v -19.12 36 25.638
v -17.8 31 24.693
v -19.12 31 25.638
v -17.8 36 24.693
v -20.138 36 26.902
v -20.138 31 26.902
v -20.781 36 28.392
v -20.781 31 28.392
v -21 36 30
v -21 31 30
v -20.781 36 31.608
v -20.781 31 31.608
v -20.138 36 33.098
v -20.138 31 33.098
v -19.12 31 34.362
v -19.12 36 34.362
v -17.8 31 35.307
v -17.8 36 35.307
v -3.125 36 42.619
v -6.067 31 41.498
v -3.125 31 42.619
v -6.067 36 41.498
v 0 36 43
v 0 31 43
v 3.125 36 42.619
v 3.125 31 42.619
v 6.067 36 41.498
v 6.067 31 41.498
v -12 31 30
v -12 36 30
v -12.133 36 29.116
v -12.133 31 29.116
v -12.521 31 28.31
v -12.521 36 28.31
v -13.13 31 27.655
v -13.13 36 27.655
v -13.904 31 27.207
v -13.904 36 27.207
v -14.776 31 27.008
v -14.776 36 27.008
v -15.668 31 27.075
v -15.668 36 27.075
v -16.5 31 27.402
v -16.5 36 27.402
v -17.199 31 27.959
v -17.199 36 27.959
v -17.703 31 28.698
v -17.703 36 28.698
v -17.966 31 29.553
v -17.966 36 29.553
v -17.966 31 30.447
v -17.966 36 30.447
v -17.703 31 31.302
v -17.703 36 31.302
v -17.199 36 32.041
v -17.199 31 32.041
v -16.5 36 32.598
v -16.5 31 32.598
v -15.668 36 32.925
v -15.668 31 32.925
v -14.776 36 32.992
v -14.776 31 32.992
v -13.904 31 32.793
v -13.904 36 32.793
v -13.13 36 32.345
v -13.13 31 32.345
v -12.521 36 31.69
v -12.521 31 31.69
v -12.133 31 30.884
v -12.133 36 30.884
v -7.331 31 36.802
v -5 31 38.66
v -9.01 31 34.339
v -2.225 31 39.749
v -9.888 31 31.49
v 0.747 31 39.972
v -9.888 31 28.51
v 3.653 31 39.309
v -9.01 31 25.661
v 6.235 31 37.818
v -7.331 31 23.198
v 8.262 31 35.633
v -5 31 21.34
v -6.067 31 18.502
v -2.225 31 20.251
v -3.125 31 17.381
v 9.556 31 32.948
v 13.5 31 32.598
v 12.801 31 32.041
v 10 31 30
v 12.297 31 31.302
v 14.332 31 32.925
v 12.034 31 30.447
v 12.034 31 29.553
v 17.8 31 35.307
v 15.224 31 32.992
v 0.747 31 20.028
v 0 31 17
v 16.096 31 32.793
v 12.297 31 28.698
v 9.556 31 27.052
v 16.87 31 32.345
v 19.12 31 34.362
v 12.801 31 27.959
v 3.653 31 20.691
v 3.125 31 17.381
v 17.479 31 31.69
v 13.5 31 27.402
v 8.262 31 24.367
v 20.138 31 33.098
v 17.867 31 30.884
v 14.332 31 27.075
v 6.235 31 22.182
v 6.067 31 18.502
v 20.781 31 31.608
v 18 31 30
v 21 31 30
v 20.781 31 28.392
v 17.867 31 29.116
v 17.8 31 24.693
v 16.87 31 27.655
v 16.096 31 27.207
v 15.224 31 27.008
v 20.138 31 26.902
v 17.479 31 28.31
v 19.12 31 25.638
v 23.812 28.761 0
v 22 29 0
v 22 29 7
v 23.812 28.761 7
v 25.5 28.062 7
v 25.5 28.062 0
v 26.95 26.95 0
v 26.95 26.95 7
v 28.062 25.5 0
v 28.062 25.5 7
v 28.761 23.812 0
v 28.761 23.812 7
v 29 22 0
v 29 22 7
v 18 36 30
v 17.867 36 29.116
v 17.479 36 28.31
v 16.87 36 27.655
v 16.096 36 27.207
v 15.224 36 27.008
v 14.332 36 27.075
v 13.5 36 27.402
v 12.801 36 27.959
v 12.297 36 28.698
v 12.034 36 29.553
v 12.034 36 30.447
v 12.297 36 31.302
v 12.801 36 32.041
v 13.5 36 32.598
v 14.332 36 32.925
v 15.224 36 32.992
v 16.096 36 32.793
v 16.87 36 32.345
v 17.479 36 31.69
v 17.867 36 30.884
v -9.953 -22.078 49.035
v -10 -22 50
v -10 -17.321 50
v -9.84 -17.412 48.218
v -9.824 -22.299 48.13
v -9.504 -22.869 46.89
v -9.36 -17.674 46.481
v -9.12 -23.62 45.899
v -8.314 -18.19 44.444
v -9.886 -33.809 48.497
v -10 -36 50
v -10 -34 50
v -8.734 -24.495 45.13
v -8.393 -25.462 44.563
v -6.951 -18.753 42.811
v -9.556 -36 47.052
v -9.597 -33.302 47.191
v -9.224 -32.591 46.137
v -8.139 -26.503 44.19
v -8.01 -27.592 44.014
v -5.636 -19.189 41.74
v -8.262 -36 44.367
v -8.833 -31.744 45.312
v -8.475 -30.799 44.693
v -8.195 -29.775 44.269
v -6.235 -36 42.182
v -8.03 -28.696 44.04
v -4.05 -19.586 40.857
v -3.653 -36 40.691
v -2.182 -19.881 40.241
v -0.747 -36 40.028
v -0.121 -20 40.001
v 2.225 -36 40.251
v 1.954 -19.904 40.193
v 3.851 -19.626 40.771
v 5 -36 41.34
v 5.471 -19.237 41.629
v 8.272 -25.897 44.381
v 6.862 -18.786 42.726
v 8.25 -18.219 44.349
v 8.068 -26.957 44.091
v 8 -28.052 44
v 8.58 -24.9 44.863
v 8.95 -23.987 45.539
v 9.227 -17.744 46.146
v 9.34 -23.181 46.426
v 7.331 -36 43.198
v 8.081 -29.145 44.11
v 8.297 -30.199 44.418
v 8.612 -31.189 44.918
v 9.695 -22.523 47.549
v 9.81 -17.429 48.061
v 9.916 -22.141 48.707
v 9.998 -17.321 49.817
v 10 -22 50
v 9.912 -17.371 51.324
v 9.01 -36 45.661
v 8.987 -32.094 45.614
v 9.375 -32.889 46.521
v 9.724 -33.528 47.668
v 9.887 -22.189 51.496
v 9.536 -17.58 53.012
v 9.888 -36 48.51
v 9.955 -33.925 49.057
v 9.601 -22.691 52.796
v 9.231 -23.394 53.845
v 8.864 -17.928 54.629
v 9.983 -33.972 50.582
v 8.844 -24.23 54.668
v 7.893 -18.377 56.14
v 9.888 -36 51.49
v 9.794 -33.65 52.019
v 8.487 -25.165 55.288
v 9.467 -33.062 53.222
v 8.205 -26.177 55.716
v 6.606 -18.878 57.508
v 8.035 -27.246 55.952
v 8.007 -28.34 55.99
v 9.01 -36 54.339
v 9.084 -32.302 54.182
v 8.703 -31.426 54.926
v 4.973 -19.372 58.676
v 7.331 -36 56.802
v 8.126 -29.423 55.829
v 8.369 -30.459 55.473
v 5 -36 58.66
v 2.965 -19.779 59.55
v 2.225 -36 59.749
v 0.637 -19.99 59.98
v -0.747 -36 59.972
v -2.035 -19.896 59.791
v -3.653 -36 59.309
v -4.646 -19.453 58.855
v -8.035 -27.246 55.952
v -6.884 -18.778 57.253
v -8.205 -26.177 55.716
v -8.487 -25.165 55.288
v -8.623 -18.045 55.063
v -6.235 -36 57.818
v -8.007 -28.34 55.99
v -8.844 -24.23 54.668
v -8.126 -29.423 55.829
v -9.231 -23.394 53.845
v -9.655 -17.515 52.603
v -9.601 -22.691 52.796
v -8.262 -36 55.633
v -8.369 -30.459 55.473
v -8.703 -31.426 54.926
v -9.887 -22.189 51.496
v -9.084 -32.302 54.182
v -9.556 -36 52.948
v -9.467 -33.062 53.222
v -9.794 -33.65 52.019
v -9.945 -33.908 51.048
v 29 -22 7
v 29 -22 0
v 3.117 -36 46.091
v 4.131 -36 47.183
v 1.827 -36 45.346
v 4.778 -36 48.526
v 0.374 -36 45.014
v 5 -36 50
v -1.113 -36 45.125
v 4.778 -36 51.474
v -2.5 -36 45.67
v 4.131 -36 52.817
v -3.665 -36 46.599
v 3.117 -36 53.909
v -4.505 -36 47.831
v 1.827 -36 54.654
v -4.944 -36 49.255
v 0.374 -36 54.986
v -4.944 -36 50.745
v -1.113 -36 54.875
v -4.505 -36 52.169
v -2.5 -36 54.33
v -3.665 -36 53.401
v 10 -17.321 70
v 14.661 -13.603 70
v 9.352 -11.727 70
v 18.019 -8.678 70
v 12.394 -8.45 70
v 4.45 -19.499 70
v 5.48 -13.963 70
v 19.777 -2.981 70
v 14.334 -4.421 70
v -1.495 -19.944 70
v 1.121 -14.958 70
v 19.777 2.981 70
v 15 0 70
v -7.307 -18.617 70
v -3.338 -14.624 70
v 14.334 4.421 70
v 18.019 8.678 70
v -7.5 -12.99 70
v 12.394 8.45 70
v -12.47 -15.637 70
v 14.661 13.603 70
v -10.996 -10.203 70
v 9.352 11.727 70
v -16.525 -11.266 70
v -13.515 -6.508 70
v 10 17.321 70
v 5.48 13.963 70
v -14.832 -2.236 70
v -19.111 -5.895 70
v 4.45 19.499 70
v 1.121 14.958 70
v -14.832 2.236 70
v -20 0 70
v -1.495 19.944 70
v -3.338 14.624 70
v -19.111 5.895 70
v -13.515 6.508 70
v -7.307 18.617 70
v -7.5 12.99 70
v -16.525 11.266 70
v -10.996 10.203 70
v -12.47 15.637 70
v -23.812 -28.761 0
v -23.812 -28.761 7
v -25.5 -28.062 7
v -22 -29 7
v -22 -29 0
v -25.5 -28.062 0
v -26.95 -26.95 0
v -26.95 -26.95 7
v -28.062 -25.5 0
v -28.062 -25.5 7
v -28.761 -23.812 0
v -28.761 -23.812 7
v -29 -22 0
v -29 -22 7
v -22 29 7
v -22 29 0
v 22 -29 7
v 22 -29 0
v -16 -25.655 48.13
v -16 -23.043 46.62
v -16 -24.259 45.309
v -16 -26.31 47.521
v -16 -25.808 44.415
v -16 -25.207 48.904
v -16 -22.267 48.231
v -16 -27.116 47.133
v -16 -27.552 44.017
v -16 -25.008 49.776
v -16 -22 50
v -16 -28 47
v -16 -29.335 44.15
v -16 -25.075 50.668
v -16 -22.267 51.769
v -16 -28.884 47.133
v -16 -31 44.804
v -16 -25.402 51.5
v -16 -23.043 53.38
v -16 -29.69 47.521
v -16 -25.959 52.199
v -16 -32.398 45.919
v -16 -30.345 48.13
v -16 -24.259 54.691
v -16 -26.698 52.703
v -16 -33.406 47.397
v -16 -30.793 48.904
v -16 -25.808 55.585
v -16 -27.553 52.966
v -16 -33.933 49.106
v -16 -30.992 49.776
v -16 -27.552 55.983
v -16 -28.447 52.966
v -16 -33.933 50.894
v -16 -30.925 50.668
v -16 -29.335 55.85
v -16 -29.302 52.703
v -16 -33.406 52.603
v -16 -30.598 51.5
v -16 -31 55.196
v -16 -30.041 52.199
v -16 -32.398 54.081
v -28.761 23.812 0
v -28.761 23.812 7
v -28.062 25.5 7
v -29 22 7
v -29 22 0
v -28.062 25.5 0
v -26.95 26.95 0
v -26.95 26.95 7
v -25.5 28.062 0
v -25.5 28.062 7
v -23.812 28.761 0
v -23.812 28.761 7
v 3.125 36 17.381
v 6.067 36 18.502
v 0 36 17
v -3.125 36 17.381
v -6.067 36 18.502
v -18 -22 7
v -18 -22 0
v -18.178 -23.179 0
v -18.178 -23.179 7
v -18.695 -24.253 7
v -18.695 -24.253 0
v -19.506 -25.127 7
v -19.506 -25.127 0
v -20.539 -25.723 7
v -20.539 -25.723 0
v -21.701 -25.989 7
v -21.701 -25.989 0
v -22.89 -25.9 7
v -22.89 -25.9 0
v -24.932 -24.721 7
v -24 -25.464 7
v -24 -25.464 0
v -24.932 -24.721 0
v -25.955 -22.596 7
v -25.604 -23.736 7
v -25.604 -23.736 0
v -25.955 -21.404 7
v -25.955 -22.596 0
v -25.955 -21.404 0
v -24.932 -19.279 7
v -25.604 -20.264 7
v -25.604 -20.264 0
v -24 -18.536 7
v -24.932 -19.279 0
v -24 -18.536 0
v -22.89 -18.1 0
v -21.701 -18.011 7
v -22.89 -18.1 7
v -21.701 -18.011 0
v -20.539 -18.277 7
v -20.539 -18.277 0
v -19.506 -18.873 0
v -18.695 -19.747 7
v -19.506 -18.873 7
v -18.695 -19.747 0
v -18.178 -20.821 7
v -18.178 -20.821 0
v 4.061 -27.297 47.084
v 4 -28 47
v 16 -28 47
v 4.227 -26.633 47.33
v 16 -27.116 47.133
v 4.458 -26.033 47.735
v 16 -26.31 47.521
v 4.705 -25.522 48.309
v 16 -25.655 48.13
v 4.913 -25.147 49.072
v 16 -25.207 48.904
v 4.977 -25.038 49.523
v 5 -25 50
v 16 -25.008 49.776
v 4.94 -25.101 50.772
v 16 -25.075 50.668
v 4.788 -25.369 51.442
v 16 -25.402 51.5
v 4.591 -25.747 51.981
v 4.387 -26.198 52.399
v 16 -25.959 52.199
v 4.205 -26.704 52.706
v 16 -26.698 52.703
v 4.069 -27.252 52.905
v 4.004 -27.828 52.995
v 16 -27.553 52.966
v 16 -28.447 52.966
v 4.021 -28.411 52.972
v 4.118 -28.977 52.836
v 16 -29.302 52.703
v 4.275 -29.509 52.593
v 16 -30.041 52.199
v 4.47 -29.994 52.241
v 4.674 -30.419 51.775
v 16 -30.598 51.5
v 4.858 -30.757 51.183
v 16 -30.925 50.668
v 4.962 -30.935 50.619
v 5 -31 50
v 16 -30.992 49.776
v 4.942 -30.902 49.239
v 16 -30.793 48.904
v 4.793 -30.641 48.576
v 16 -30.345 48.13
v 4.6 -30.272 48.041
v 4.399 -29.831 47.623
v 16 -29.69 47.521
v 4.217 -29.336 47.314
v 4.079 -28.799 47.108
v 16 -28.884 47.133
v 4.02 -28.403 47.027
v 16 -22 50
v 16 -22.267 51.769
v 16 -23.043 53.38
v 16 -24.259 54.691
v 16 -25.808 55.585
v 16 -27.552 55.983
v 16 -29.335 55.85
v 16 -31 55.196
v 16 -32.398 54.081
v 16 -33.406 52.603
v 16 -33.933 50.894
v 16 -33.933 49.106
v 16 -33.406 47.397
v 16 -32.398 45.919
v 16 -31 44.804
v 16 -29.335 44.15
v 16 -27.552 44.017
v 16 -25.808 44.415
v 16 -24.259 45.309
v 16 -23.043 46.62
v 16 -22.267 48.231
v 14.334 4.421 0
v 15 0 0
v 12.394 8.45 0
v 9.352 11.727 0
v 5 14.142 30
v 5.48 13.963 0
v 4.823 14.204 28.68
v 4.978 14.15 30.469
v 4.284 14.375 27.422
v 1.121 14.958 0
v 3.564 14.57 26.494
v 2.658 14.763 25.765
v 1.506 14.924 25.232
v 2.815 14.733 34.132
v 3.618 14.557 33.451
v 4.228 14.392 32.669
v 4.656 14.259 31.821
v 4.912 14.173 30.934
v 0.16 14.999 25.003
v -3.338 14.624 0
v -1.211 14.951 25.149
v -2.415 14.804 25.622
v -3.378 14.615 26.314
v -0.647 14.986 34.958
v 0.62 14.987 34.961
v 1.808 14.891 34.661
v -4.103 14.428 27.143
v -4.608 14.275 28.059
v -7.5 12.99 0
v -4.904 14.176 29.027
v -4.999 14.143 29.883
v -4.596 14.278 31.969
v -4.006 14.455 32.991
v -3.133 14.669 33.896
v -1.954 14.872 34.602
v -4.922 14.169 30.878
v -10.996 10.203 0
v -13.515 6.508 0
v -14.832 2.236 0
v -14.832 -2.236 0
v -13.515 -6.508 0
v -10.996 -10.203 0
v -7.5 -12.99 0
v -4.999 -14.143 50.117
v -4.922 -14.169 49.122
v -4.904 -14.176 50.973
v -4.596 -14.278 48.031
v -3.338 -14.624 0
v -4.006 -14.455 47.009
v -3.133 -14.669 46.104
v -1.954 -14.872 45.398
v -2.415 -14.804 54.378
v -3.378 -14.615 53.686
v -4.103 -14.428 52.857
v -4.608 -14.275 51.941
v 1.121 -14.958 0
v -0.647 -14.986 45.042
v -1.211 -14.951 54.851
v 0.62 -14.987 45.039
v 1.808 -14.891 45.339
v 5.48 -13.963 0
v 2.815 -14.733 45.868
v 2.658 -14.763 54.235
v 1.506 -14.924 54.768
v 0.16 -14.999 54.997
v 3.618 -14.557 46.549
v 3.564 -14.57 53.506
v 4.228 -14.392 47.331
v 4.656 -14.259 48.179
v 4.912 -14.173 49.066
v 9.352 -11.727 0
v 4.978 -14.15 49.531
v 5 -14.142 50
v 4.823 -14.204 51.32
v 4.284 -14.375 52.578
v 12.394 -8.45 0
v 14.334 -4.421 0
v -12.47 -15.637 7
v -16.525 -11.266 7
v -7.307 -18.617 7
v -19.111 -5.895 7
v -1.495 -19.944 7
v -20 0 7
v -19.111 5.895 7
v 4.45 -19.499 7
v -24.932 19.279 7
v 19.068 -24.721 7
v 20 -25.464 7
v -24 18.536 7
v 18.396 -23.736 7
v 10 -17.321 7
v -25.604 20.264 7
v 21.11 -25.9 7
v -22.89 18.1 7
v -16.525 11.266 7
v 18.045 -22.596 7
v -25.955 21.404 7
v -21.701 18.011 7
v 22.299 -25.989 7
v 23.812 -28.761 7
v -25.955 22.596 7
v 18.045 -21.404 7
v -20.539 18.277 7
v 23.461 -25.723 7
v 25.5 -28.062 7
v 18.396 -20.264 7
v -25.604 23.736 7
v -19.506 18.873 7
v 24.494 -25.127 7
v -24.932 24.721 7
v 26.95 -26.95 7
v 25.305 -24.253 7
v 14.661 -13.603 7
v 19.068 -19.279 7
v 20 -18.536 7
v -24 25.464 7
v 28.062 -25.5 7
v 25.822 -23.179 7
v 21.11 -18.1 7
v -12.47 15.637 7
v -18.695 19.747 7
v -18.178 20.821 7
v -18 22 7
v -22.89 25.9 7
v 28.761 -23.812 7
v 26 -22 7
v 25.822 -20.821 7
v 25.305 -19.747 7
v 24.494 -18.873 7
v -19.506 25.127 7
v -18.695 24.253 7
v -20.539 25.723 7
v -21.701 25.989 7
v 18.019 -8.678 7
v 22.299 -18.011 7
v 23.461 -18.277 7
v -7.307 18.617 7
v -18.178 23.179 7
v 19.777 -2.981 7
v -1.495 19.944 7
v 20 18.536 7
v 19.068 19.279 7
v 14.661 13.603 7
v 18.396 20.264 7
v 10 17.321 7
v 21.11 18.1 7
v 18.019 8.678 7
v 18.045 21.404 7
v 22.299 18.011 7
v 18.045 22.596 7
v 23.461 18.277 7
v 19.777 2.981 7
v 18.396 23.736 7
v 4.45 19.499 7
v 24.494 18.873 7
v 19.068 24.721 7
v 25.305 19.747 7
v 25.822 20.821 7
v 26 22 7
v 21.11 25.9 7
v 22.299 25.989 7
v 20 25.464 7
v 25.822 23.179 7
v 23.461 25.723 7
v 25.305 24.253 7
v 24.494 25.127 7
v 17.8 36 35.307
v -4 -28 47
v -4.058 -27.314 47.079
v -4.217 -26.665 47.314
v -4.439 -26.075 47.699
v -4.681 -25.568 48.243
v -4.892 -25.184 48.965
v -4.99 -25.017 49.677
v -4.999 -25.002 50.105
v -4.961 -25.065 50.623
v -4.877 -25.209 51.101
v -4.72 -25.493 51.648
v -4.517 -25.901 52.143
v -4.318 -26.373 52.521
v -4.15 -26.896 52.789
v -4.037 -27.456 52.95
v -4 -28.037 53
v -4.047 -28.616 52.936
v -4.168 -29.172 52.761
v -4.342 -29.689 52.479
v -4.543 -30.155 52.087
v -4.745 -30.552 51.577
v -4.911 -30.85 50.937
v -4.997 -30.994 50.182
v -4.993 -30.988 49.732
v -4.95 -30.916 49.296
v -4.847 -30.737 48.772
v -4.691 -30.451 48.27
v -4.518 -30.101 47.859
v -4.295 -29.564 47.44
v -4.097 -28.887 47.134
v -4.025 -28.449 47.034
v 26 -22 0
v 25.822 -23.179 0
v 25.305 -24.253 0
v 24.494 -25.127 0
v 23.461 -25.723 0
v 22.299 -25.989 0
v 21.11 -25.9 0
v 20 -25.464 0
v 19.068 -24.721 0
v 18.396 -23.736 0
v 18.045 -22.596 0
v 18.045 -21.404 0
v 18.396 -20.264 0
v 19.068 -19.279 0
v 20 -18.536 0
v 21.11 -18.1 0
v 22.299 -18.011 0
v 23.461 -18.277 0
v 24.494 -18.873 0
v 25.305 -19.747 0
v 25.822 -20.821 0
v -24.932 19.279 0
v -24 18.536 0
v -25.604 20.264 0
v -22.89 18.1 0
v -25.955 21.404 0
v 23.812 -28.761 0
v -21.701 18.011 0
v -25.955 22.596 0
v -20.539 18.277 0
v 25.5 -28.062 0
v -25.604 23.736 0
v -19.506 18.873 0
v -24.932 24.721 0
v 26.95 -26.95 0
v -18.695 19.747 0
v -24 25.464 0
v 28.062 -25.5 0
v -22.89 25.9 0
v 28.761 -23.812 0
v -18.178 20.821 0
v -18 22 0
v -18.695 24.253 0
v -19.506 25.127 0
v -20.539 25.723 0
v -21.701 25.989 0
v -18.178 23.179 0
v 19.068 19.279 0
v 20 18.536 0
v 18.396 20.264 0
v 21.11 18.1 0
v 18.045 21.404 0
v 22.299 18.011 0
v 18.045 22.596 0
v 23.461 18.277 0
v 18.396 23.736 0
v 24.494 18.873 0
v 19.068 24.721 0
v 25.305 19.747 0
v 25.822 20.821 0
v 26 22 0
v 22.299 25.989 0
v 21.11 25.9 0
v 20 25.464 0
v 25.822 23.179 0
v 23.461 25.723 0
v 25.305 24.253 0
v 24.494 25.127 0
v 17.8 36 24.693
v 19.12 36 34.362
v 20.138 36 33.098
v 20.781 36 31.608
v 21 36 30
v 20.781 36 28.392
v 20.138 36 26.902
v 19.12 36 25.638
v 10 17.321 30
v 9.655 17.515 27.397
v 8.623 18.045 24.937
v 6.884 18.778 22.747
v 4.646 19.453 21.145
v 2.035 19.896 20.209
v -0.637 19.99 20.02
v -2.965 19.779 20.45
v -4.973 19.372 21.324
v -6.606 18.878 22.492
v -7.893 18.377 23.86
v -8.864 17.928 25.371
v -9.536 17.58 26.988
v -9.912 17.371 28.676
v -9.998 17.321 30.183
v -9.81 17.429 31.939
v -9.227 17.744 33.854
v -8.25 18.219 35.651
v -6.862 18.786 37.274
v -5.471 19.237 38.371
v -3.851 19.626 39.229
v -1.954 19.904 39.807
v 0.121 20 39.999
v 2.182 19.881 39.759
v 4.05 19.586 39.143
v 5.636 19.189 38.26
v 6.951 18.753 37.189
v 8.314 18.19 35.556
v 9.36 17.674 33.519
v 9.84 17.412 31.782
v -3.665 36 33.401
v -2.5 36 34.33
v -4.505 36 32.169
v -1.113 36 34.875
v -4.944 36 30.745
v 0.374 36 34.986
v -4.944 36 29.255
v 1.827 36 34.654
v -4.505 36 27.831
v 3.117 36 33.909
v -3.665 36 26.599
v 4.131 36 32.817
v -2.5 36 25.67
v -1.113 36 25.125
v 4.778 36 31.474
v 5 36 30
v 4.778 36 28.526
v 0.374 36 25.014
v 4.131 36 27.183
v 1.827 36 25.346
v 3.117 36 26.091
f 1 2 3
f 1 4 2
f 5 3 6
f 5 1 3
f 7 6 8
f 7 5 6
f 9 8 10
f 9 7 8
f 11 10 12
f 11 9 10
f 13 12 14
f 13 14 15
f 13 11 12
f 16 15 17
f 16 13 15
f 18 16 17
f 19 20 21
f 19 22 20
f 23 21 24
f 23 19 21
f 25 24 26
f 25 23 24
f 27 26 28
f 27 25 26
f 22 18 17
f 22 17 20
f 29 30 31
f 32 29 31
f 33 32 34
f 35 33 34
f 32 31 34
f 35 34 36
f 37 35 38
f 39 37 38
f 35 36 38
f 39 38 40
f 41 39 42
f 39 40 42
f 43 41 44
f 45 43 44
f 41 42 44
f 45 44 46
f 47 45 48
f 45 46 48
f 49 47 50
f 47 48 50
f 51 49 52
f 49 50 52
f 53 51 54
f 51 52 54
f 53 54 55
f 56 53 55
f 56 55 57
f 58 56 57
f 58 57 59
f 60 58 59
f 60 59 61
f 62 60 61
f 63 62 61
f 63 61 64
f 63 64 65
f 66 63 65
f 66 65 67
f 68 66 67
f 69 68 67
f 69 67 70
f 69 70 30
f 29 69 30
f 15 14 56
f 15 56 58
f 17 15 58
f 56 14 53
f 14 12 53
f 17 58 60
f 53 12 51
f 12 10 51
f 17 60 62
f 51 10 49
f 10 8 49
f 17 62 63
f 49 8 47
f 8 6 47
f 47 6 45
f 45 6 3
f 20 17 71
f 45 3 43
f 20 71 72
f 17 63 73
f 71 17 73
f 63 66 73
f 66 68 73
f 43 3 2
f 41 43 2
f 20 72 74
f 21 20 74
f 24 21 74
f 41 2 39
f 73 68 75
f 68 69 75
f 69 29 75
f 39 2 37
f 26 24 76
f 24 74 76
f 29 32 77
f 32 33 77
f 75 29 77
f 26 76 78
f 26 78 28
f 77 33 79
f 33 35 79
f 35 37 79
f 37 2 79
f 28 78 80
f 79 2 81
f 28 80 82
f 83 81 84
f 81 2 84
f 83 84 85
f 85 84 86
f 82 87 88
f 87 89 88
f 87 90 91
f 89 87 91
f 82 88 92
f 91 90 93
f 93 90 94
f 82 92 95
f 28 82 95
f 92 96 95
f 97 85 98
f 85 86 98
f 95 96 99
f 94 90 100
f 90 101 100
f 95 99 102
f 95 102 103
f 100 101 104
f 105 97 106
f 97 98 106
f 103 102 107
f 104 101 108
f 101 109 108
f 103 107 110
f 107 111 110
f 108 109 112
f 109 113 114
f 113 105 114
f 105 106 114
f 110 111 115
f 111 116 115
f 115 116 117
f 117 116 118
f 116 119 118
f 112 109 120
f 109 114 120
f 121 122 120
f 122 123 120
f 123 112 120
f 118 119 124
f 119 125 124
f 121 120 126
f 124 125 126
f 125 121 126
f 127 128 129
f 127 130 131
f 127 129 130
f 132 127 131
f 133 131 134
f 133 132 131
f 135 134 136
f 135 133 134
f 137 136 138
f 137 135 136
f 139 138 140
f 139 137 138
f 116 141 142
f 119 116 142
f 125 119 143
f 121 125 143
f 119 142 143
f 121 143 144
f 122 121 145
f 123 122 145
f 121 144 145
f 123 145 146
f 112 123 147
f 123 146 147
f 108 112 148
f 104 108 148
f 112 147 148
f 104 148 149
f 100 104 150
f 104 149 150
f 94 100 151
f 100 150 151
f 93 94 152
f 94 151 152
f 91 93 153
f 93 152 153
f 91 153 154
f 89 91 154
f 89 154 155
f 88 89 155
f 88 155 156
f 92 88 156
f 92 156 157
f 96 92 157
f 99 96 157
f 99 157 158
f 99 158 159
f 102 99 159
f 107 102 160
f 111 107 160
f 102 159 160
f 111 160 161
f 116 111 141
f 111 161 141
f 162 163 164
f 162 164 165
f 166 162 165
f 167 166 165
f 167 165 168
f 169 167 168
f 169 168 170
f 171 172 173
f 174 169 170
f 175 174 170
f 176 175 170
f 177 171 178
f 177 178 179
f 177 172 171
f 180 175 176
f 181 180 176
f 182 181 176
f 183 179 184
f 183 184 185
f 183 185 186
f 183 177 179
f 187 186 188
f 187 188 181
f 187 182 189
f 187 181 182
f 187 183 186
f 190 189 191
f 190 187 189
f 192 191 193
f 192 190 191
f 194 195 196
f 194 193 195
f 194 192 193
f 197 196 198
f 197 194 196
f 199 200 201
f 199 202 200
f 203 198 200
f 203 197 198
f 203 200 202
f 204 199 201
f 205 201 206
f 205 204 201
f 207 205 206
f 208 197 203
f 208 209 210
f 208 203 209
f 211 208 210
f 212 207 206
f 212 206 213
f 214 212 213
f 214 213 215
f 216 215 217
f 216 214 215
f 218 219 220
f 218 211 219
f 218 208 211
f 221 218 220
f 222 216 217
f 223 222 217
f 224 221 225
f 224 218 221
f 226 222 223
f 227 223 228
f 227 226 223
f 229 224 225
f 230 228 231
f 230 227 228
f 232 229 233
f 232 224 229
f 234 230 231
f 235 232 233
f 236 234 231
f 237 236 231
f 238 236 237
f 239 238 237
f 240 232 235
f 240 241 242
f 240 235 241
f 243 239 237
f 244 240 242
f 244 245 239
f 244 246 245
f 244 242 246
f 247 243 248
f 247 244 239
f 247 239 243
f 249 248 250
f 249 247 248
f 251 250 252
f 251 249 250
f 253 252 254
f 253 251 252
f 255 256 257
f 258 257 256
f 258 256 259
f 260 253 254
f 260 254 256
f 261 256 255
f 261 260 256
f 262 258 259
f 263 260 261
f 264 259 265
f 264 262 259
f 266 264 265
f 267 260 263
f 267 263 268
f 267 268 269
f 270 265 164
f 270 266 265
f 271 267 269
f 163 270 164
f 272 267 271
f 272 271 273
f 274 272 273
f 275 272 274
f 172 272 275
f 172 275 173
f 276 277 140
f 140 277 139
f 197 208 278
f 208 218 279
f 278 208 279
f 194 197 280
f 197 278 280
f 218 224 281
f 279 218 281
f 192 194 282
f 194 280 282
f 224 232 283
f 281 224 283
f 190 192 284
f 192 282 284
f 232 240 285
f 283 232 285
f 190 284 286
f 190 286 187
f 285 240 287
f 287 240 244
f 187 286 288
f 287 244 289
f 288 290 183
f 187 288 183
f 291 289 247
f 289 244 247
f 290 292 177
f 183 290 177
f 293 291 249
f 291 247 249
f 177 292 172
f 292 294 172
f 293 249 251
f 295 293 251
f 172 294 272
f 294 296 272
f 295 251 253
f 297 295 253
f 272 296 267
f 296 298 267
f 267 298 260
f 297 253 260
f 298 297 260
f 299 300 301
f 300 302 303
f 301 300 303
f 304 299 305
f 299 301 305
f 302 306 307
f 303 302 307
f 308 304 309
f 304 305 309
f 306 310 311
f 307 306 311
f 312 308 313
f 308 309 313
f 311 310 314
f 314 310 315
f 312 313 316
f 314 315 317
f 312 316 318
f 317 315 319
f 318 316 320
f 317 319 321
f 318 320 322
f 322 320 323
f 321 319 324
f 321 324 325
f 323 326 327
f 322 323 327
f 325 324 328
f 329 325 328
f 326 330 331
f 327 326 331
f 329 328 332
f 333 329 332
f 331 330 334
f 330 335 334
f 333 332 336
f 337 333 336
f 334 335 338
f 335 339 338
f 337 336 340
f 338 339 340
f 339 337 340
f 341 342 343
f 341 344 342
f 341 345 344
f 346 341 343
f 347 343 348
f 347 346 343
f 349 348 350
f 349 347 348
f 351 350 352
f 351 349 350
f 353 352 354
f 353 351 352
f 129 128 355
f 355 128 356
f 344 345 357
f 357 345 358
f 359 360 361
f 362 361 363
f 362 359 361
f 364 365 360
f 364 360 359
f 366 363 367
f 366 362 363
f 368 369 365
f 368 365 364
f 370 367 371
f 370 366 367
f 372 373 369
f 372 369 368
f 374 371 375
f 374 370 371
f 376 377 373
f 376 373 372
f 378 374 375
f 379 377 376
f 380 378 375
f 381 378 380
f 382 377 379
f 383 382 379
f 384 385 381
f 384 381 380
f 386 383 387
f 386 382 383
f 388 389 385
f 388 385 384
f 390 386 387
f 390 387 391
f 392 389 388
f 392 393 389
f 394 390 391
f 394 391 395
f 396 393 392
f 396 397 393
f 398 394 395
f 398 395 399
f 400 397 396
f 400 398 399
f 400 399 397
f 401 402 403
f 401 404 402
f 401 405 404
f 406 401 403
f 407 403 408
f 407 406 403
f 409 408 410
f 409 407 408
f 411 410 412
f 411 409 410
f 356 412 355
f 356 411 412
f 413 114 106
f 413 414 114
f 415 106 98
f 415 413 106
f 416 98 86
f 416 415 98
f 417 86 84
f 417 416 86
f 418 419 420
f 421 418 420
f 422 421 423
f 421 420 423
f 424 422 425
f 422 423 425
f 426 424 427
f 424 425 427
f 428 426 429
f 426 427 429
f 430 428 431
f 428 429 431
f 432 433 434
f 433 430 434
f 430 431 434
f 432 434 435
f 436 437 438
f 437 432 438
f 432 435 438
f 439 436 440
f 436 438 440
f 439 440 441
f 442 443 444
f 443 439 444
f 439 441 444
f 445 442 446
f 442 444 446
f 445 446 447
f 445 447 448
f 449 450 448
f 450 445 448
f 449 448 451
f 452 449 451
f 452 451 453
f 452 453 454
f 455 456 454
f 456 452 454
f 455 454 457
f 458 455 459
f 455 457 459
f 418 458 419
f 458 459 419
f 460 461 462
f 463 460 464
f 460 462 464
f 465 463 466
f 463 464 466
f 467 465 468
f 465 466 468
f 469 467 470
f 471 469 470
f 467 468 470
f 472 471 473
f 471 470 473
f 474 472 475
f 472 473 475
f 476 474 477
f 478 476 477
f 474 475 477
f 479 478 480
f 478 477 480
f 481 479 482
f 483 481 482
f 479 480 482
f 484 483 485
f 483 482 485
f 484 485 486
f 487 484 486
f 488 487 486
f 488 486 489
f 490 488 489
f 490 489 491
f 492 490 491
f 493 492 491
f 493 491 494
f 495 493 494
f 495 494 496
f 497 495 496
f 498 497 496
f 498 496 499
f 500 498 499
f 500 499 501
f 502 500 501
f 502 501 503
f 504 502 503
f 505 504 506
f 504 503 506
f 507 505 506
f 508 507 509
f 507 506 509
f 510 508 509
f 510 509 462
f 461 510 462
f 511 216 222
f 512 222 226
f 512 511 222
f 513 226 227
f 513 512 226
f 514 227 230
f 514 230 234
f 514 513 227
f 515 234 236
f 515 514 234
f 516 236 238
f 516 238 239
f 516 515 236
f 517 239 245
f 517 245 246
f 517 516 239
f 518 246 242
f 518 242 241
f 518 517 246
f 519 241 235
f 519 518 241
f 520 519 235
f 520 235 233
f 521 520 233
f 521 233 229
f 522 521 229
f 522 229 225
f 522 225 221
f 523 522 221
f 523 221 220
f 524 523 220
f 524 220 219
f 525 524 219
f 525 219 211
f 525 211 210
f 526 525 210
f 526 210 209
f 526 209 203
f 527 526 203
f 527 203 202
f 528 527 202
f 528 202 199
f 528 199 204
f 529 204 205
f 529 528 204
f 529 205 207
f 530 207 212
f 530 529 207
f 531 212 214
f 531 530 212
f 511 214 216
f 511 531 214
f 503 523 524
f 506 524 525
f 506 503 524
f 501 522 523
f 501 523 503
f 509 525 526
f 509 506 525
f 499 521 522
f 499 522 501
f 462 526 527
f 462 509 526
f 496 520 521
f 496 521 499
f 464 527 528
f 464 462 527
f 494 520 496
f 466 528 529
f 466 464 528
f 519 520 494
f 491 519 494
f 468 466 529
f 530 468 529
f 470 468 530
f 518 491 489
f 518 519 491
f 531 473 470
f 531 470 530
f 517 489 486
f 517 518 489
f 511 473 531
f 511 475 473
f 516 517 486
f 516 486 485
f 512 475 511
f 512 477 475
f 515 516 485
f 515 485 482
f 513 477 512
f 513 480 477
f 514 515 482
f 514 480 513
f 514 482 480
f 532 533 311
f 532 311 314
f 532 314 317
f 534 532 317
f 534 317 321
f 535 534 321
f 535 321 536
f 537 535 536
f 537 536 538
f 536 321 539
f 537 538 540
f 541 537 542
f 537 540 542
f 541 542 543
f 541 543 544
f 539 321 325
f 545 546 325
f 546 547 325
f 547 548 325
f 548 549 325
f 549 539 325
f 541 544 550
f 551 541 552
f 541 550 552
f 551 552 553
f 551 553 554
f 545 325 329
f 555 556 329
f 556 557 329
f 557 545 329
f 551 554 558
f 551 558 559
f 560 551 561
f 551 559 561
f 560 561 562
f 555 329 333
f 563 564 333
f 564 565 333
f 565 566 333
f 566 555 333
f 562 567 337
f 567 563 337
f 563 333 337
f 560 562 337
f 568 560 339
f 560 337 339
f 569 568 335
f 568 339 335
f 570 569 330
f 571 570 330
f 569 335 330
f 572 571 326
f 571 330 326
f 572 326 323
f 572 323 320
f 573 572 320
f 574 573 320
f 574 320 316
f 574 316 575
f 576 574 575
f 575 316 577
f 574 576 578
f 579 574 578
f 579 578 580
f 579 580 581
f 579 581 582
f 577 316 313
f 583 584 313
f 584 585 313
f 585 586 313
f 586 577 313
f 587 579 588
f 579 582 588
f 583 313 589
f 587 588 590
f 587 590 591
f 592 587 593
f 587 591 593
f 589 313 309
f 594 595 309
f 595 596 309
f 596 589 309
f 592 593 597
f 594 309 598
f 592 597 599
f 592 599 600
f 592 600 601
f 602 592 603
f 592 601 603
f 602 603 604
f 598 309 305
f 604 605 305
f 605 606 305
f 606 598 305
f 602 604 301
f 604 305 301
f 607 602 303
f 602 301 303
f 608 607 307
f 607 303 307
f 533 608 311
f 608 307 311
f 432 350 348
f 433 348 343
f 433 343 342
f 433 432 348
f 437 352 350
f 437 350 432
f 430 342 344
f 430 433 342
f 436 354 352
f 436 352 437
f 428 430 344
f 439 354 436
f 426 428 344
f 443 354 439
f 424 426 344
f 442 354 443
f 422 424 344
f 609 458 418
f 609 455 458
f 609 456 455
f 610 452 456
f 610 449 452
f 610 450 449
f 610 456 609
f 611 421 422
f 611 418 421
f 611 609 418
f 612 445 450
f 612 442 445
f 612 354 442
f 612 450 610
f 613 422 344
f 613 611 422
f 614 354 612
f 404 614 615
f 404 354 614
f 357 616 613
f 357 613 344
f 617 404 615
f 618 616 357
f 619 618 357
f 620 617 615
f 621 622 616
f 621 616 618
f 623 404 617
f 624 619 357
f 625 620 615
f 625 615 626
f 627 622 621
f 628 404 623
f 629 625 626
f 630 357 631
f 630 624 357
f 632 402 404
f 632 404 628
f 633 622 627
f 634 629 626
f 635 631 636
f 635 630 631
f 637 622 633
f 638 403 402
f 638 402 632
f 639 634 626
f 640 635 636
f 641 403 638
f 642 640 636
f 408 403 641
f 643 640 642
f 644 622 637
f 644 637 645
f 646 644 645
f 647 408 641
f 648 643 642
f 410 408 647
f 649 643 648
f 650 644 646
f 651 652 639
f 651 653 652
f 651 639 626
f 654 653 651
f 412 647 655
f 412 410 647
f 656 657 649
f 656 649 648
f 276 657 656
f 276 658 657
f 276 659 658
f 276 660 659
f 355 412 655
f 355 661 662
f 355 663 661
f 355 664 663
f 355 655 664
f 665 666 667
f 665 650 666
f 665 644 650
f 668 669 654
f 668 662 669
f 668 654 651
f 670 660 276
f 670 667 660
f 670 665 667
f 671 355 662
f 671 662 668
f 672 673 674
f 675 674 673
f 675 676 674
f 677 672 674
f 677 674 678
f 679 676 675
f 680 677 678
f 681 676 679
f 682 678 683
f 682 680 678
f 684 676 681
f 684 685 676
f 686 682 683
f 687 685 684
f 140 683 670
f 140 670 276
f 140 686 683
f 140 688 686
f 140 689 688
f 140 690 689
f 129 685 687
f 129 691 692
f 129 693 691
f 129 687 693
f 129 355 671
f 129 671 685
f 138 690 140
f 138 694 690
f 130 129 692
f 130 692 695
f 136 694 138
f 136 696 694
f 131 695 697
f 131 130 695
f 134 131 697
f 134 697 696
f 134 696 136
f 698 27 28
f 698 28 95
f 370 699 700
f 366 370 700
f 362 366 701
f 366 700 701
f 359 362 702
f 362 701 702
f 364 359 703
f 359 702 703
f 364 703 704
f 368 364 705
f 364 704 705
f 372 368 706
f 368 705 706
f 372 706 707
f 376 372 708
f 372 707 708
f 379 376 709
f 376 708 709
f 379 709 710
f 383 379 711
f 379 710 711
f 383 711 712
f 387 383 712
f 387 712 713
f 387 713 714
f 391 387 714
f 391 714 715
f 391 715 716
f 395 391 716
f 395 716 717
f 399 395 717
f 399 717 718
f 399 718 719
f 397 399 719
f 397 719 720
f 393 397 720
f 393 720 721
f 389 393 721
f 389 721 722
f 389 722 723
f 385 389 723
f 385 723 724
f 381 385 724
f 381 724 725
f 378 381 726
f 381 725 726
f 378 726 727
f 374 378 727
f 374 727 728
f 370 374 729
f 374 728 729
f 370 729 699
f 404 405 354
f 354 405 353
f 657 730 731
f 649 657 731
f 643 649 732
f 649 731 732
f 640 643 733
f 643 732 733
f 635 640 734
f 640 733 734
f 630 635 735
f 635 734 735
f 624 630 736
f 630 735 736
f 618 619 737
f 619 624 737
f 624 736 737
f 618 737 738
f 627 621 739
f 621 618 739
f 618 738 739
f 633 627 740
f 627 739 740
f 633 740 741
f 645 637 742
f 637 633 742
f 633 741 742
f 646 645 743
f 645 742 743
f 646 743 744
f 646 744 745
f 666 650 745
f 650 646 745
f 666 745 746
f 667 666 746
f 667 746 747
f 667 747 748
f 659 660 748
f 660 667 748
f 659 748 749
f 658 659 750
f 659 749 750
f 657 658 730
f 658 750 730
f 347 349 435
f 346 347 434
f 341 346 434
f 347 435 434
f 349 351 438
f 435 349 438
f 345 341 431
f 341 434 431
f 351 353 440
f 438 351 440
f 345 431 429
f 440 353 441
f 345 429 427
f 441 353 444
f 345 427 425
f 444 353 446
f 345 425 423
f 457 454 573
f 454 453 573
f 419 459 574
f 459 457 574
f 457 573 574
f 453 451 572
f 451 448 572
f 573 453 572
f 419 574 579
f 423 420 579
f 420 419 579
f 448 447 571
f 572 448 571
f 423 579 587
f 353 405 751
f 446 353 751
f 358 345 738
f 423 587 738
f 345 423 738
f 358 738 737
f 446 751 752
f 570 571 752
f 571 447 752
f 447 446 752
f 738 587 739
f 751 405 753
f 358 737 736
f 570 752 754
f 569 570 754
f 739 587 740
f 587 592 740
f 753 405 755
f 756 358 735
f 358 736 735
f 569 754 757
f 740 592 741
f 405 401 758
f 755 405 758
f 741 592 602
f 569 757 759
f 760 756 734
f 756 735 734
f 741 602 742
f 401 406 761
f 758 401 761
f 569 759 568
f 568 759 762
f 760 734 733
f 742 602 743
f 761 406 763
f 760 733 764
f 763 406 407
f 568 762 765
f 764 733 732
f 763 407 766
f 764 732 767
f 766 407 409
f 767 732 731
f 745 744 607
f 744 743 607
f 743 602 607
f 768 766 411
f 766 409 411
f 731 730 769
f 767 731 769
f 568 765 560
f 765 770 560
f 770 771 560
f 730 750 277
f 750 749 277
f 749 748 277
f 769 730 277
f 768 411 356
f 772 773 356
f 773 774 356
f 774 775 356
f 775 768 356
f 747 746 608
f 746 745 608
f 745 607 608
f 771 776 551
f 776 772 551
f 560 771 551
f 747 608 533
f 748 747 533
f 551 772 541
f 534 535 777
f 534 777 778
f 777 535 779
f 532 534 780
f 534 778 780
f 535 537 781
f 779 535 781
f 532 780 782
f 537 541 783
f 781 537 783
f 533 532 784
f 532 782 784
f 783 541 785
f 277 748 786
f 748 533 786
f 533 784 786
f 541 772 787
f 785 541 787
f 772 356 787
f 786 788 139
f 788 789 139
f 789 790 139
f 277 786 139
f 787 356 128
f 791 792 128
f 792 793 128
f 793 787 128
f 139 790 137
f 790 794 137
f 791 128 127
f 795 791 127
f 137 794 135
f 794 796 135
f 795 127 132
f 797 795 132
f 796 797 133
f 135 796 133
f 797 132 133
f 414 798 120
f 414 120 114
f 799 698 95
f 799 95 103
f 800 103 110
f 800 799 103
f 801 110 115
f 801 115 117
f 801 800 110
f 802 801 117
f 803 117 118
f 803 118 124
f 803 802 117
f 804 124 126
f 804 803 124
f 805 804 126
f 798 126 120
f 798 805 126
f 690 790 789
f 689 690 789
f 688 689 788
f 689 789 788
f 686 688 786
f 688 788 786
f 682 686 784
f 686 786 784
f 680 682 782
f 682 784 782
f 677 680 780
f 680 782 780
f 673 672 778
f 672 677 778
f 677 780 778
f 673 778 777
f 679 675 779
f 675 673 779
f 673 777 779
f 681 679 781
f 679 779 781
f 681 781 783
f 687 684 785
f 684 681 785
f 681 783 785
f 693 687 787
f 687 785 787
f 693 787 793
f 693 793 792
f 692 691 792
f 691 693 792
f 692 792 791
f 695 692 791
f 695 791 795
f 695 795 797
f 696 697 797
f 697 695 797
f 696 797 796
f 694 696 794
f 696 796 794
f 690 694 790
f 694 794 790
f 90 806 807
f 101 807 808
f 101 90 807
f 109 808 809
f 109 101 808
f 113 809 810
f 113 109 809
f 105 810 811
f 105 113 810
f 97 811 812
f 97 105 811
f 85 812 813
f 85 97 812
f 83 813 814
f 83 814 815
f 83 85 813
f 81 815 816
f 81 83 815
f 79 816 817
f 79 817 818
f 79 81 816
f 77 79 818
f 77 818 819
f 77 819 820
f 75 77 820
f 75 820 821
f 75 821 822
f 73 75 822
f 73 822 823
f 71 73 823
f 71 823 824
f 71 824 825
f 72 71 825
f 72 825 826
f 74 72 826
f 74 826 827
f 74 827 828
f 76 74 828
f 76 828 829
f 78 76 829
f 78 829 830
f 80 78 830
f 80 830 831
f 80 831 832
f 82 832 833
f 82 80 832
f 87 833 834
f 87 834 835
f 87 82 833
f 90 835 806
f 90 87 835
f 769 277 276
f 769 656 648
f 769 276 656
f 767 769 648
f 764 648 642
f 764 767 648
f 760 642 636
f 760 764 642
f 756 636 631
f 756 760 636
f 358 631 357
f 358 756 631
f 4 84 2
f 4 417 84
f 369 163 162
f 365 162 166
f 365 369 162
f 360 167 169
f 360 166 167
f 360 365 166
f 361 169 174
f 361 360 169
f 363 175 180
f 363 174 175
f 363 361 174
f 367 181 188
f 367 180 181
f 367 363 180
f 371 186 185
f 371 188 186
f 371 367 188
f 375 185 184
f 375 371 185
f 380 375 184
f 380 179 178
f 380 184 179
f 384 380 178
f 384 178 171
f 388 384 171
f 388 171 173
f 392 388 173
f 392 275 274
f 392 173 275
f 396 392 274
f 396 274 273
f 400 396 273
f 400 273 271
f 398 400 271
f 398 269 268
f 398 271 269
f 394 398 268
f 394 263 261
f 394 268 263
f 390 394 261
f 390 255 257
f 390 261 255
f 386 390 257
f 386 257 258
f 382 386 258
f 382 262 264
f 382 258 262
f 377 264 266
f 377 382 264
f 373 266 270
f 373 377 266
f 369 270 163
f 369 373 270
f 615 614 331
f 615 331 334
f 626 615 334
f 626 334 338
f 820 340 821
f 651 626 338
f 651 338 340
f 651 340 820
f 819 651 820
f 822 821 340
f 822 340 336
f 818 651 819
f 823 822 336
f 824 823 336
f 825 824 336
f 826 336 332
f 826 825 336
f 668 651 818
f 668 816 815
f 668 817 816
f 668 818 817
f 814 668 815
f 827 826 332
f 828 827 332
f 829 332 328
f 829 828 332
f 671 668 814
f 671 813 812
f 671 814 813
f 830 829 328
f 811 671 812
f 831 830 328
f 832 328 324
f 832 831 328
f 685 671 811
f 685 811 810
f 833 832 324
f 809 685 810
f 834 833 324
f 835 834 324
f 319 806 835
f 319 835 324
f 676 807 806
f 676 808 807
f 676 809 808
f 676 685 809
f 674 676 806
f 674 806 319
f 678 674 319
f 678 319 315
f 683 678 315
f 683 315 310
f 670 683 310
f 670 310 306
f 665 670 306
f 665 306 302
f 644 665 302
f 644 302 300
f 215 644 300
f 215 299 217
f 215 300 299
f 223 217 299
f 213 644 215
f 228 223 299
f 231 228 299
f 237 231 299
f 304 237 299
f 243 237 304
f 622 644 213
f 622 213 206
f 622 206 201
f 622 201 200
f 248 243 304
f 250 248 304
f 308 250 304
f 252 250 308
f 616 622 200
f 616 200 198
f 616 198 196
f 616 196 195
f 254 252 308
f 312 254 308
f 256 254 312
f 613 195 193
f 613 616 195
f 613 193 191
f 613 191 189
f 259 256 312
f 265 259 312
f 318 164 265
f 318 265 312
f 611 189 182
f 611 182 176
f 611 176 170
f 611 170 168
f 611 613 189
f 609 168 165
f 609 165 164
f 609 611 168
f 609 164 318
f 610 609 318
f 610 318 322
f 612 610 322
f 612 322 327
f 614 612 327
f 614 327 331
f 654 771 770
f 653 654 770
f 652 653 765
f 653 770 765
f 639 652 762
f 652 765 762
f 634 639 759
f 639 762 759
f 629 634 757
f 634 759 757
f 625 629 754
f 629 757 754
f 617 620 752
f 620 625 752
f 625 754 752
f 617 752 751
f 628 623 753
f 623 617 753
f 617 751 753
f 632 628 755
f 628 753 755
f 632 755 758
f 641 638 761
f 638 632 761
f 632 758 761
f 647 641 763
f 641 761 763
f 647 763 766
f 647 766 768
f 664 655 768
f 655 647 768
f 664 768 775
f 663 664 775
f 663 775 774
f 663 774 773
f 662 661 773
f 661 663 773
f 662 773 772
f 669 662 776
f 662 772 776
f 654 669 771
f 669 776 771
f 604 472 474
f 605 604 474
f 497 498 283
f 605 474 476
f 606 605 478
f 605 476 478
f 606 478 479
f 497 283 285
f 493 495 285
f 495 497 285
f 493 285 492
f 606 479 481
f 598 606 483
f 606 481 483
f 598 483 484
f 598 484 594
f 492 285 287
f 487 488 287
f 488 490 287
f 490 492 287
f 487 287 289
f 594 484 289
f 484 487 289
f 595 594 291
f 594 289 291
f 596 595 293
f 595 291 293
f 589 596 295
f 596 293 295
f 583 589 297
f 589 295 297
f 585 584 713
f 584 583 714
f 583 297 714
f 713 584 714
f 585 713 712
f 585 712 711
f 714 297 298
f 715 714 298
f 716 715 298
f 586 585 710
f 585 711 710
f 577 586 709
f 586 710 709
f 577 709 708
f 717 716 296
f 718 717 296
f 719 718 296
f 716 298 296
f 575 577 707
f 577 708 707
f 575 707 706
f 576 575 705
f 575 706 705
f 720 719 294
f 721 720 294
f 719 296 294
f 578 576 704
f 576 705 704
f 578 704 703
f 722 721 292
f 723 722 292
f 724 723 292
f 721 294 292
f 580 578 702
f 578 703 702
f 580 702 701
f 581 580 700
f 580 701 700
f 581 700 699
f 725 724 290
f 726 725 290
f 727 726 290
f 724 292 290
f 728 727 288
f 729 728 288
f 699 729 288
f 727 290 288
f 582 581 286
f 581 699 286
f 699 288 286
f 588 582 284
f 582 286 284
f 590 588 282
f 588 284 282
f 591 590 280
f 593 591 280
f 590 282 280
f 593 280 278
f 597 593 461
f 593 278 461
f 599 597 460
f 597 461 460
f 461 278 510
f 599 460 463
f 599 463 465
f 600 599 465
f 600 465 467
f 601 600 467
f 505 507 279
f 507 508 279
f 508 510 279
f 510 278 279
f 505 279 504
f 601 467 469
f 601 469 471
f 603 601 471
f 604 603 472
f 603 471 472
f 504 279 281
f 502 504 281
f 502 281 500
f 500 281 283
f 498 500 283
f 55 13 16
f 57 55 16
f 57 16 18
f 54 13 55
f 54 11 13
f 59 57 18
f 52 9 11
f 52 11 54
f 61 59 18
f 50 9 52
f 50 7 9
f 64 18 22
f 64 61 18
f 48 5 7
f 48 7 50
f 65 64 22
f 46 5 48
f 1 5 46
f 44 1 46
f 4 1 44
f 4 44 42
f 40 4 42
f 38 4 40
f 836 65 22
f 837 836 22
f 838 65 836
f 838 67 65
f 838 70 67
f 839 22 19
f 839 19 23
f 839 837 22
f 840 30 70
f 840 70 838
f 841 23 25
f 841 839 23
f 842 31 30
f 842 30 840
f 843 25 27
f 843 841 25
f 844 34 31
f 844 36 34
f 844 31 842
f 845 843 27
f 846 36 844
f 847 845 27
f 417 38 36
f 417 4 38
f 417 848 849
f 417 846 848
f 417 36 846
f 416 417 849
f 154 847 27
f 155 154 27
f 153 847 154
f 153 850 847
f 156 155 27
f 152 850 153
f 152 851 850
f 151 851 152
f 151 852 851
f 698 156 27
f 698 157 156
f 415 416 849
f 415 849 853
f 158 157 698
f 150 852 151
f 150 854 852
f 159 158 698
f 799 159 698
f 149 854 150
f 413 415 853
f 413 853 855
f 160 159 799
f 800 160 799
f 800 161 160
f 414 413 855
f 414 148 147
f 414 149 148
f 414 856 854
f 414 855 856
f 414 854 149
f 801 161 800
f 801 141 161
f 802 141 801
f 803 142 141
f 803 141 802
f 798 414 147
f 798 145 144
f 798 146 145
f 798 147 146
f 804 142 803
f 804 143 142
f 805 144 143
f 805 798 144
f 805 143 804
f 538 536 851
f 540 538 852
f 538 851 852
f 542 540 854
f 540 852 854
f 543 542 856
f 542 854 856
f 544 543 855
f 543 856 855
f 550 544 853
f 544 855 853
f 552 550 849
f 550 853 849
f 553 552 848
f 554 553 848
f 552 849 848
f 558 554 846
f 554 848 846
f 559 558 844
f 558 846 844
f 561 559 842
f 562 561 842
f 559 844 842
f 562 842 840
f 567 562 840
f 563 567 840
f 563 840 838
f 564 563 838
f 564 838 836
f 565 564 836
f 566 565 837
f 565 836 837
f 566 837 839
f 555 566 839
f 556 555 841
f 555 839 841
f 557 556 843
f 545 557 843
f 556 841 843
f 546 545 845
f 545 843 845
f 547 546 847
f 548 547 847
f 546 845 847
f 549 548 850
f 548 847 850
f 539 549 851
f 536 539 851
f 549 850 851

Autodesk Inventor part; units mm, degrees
sketch "草图1" plane through (0, 0, 0) normal (0, 0, 1) x (1, 0, 0)
  line L0 (22, 29) -> (-22, 29)
  arc A0 (-22, 29) -> (-29, 22) centre (-22, 22) ccw
  line L1 (-29, 22) -> (-29, -22)
  arc A1 (-29, -22) -> (-22, -29) centre (-22, -22) ccw
  line L2 (-22, -29) -> (22, -29)
  arc A2 (22, -29) -> (29, -22) centre (22, -22) ccw
  line L3 (29, -22) -> (29, 22)
  arc A3 (29, 22) -> (22, 29) centre (22, 22) ccw
  circle A4 centre (-22, 22) radius 4
  circle A5 centre (22, 22) radius 4
  circle A6 centre (22, -22) radius 4
  circle A7 centre (-22, -22) radius 4
  point P0 (0, 0)
  point P1 (0, 29)
  point P2 (-29, 0)
  dimension "d0" = 58
  dimension "d1" = 58
  dimension "d2" = 7
  dimension "d3" = 8
extrude "拉伸1" add sketch "草图1" along normal blind 7
sketch "草图2" plane through (0, 0, 0) normal (0, 0, -1) x (-1, 0, 0)
  circle A0 centre (0, 0) radius 20
  dimension "d6" = 40
extrude "拉伸2" add sketch "草图2" against normal blind 70
sketch "草图3" plane through (0, 0, 70) normal (0, 0, 1) x (1, 0, 0)
  circle A0 centre (0, 0) radius 15
  dimension "d9" = 30
extrude "拉伸3" cut sketch "草图3" against normal blind 70
ref_plane "工作平面4" through (0, -36, 0) normal (0, 1, 0) x (-1, 0, 0)
sketch "草图6" plane through (0, -36, 0) normal (0, 1, 0) x (-1, 0, 0)
  line L0 (22, 0) -> (-22, 0) projected
  line L1 (-22, 0) -> (-22, 7) projected
  line L2 (22, 7) -> (-22, 7) projected
  line L3 (22, 0) -> (22, 7) projected
  line L4 (20, 70) -> (-20, 70) projected
  line L5 (-20, 7) -> (20, 7) projected
  circle A0 centre (0, 50) radius 10
  point P0 (0, 0)
  point P1 (0, 70)
  dimension "d16" = 20
  dimension "d17" = 50
extrude "拉伸4" add sketch "草图6" along normal up to surface contours A0
sketch "草图7" plane through (0, -36, 50) normal (0, -1, 0) x (1, 0, 0)
  circle A0 centre (0, 0) radius 10 projected
  circle A1 centre (0, 0) radius 5
  point P0 (0, -50)
  dimension "d20" = 10
extrude "拉伸5" cut sketch "草图7" against normal up to surface contours A1
ref_plane "工作平面9" through (0, 36, 30) normal (0, 1, 0) x (1, 0, 0)
sketch "草图9" plane through (0, 36, 30) normal (0, 1, 0) x (1, 0, 0)
  circle A0 centre (0, 0) radius 10
  point P0 (0, 30)
  dimension "d28" = 20
extrude "拉伸7" add sketch "草图9" against normal up to surface
ref_plane "工作平面10" through (0, 36, 30) normal (0, 1, 0) x (1, 0, 0)
sketch "草图10" plane through (0, 36, 30) normal (0, 1, 0) x (1, 0, 0)
  circle A0 centre (0, 0) radius 5
  point P0 (0, 30)
  dimension "d31" = 10
extrude "拉伸8" cut sketch "草图10" against normal up to surface
sketch "草图11" plane through (0, 36, 30) normal (0, 1, 0) x (1, 0, 0)
  point P0 (0, 30)
sketch "草图12" plane through (0, 36, 30) normal (0, 1, 0) x (1, 0, 0)
  circle A0 centre (0, 0) radius 5 projected
  circle A1 centre (0, 0) radius 10 projected
  line L0 (6.0667, -11.4976) -> (17.8, -5.3066)
  arc A2 (17.8, -5.3066) -> (17.8, 5.3066) centre (15, 0) ccw
  line L1 (17.8, 5.3066) -> (6.0667, 11.4976)
  line L2 (-6.0667, 11.4976) -> (-17.8, 5.3066)
  arc A3 (-17.8, 5.3066) -> (-17.8, -5.3066) centre (-15, 0) ccw
  line L3 (-17.8, -5.3066) -> (-6.0667, -11.4976)
  circle A4 centre (15, 0) radius 3
  arc A5 (6.0667, 11.4976) -> (-6.0667, 11.4976) centre (0, 0) ccw
  arc A6 (-6.0667, -11.4976) -> (6.0667, -11.4976) centre (0, 0) ccw
  circle A7 centre (-15, 0) radius 3
  point P0 (0, 30)
  point P1 (0, -13)
  point P2 (0, 13)
  dimension "d34" = 6
  dimension "d35" = 6
  dimension "d36" = 30
  dimension "d37" = 13
extrude "拉伸9" add sketch "草图12" against normal blind 5 contours A6 L3 A3 L2 A5 L1 A2 L0
ref_plane "工作平面11" through (16, 0, 0) normal (1, 0, 0) x (0, 1, 0)
sketch "草图13" plane through (16, 0, 0) normal (1, 0, 0) x (0, 1, 0)
  line L0 (-36, 60) -> (-20, 60) projected
  line L1 (-36, 40) -> (-20, 40) projected
  circle A0 centre (-28, 50) radius 6
  line L2 (0, 84) -> (0, -14) projected
  line L3 (-22, 0) -> (22, 0) projected
  point P0 (0, 0)
  dimension "d41" = 12
  dimension "d42" = 28
  dimension "d43" = 50
extrude "拉伸10" add sketch "草图13" against normal up to surface
mirror "镜像1" about plane through (0, 0, 0) normal (1, 0, 0) of "拉伸10"
sketch "草图14" plane through (16, -28, 50) normal (1, 0, 0) x (0, 0, -1)
  circle A0 centre (0, 0) radius 3
  point P0 (50, 28)
  dimension "d46" = 6
extrude "拉伸11" cut sketch "草图14" against normal up to surface (32 mm away)
